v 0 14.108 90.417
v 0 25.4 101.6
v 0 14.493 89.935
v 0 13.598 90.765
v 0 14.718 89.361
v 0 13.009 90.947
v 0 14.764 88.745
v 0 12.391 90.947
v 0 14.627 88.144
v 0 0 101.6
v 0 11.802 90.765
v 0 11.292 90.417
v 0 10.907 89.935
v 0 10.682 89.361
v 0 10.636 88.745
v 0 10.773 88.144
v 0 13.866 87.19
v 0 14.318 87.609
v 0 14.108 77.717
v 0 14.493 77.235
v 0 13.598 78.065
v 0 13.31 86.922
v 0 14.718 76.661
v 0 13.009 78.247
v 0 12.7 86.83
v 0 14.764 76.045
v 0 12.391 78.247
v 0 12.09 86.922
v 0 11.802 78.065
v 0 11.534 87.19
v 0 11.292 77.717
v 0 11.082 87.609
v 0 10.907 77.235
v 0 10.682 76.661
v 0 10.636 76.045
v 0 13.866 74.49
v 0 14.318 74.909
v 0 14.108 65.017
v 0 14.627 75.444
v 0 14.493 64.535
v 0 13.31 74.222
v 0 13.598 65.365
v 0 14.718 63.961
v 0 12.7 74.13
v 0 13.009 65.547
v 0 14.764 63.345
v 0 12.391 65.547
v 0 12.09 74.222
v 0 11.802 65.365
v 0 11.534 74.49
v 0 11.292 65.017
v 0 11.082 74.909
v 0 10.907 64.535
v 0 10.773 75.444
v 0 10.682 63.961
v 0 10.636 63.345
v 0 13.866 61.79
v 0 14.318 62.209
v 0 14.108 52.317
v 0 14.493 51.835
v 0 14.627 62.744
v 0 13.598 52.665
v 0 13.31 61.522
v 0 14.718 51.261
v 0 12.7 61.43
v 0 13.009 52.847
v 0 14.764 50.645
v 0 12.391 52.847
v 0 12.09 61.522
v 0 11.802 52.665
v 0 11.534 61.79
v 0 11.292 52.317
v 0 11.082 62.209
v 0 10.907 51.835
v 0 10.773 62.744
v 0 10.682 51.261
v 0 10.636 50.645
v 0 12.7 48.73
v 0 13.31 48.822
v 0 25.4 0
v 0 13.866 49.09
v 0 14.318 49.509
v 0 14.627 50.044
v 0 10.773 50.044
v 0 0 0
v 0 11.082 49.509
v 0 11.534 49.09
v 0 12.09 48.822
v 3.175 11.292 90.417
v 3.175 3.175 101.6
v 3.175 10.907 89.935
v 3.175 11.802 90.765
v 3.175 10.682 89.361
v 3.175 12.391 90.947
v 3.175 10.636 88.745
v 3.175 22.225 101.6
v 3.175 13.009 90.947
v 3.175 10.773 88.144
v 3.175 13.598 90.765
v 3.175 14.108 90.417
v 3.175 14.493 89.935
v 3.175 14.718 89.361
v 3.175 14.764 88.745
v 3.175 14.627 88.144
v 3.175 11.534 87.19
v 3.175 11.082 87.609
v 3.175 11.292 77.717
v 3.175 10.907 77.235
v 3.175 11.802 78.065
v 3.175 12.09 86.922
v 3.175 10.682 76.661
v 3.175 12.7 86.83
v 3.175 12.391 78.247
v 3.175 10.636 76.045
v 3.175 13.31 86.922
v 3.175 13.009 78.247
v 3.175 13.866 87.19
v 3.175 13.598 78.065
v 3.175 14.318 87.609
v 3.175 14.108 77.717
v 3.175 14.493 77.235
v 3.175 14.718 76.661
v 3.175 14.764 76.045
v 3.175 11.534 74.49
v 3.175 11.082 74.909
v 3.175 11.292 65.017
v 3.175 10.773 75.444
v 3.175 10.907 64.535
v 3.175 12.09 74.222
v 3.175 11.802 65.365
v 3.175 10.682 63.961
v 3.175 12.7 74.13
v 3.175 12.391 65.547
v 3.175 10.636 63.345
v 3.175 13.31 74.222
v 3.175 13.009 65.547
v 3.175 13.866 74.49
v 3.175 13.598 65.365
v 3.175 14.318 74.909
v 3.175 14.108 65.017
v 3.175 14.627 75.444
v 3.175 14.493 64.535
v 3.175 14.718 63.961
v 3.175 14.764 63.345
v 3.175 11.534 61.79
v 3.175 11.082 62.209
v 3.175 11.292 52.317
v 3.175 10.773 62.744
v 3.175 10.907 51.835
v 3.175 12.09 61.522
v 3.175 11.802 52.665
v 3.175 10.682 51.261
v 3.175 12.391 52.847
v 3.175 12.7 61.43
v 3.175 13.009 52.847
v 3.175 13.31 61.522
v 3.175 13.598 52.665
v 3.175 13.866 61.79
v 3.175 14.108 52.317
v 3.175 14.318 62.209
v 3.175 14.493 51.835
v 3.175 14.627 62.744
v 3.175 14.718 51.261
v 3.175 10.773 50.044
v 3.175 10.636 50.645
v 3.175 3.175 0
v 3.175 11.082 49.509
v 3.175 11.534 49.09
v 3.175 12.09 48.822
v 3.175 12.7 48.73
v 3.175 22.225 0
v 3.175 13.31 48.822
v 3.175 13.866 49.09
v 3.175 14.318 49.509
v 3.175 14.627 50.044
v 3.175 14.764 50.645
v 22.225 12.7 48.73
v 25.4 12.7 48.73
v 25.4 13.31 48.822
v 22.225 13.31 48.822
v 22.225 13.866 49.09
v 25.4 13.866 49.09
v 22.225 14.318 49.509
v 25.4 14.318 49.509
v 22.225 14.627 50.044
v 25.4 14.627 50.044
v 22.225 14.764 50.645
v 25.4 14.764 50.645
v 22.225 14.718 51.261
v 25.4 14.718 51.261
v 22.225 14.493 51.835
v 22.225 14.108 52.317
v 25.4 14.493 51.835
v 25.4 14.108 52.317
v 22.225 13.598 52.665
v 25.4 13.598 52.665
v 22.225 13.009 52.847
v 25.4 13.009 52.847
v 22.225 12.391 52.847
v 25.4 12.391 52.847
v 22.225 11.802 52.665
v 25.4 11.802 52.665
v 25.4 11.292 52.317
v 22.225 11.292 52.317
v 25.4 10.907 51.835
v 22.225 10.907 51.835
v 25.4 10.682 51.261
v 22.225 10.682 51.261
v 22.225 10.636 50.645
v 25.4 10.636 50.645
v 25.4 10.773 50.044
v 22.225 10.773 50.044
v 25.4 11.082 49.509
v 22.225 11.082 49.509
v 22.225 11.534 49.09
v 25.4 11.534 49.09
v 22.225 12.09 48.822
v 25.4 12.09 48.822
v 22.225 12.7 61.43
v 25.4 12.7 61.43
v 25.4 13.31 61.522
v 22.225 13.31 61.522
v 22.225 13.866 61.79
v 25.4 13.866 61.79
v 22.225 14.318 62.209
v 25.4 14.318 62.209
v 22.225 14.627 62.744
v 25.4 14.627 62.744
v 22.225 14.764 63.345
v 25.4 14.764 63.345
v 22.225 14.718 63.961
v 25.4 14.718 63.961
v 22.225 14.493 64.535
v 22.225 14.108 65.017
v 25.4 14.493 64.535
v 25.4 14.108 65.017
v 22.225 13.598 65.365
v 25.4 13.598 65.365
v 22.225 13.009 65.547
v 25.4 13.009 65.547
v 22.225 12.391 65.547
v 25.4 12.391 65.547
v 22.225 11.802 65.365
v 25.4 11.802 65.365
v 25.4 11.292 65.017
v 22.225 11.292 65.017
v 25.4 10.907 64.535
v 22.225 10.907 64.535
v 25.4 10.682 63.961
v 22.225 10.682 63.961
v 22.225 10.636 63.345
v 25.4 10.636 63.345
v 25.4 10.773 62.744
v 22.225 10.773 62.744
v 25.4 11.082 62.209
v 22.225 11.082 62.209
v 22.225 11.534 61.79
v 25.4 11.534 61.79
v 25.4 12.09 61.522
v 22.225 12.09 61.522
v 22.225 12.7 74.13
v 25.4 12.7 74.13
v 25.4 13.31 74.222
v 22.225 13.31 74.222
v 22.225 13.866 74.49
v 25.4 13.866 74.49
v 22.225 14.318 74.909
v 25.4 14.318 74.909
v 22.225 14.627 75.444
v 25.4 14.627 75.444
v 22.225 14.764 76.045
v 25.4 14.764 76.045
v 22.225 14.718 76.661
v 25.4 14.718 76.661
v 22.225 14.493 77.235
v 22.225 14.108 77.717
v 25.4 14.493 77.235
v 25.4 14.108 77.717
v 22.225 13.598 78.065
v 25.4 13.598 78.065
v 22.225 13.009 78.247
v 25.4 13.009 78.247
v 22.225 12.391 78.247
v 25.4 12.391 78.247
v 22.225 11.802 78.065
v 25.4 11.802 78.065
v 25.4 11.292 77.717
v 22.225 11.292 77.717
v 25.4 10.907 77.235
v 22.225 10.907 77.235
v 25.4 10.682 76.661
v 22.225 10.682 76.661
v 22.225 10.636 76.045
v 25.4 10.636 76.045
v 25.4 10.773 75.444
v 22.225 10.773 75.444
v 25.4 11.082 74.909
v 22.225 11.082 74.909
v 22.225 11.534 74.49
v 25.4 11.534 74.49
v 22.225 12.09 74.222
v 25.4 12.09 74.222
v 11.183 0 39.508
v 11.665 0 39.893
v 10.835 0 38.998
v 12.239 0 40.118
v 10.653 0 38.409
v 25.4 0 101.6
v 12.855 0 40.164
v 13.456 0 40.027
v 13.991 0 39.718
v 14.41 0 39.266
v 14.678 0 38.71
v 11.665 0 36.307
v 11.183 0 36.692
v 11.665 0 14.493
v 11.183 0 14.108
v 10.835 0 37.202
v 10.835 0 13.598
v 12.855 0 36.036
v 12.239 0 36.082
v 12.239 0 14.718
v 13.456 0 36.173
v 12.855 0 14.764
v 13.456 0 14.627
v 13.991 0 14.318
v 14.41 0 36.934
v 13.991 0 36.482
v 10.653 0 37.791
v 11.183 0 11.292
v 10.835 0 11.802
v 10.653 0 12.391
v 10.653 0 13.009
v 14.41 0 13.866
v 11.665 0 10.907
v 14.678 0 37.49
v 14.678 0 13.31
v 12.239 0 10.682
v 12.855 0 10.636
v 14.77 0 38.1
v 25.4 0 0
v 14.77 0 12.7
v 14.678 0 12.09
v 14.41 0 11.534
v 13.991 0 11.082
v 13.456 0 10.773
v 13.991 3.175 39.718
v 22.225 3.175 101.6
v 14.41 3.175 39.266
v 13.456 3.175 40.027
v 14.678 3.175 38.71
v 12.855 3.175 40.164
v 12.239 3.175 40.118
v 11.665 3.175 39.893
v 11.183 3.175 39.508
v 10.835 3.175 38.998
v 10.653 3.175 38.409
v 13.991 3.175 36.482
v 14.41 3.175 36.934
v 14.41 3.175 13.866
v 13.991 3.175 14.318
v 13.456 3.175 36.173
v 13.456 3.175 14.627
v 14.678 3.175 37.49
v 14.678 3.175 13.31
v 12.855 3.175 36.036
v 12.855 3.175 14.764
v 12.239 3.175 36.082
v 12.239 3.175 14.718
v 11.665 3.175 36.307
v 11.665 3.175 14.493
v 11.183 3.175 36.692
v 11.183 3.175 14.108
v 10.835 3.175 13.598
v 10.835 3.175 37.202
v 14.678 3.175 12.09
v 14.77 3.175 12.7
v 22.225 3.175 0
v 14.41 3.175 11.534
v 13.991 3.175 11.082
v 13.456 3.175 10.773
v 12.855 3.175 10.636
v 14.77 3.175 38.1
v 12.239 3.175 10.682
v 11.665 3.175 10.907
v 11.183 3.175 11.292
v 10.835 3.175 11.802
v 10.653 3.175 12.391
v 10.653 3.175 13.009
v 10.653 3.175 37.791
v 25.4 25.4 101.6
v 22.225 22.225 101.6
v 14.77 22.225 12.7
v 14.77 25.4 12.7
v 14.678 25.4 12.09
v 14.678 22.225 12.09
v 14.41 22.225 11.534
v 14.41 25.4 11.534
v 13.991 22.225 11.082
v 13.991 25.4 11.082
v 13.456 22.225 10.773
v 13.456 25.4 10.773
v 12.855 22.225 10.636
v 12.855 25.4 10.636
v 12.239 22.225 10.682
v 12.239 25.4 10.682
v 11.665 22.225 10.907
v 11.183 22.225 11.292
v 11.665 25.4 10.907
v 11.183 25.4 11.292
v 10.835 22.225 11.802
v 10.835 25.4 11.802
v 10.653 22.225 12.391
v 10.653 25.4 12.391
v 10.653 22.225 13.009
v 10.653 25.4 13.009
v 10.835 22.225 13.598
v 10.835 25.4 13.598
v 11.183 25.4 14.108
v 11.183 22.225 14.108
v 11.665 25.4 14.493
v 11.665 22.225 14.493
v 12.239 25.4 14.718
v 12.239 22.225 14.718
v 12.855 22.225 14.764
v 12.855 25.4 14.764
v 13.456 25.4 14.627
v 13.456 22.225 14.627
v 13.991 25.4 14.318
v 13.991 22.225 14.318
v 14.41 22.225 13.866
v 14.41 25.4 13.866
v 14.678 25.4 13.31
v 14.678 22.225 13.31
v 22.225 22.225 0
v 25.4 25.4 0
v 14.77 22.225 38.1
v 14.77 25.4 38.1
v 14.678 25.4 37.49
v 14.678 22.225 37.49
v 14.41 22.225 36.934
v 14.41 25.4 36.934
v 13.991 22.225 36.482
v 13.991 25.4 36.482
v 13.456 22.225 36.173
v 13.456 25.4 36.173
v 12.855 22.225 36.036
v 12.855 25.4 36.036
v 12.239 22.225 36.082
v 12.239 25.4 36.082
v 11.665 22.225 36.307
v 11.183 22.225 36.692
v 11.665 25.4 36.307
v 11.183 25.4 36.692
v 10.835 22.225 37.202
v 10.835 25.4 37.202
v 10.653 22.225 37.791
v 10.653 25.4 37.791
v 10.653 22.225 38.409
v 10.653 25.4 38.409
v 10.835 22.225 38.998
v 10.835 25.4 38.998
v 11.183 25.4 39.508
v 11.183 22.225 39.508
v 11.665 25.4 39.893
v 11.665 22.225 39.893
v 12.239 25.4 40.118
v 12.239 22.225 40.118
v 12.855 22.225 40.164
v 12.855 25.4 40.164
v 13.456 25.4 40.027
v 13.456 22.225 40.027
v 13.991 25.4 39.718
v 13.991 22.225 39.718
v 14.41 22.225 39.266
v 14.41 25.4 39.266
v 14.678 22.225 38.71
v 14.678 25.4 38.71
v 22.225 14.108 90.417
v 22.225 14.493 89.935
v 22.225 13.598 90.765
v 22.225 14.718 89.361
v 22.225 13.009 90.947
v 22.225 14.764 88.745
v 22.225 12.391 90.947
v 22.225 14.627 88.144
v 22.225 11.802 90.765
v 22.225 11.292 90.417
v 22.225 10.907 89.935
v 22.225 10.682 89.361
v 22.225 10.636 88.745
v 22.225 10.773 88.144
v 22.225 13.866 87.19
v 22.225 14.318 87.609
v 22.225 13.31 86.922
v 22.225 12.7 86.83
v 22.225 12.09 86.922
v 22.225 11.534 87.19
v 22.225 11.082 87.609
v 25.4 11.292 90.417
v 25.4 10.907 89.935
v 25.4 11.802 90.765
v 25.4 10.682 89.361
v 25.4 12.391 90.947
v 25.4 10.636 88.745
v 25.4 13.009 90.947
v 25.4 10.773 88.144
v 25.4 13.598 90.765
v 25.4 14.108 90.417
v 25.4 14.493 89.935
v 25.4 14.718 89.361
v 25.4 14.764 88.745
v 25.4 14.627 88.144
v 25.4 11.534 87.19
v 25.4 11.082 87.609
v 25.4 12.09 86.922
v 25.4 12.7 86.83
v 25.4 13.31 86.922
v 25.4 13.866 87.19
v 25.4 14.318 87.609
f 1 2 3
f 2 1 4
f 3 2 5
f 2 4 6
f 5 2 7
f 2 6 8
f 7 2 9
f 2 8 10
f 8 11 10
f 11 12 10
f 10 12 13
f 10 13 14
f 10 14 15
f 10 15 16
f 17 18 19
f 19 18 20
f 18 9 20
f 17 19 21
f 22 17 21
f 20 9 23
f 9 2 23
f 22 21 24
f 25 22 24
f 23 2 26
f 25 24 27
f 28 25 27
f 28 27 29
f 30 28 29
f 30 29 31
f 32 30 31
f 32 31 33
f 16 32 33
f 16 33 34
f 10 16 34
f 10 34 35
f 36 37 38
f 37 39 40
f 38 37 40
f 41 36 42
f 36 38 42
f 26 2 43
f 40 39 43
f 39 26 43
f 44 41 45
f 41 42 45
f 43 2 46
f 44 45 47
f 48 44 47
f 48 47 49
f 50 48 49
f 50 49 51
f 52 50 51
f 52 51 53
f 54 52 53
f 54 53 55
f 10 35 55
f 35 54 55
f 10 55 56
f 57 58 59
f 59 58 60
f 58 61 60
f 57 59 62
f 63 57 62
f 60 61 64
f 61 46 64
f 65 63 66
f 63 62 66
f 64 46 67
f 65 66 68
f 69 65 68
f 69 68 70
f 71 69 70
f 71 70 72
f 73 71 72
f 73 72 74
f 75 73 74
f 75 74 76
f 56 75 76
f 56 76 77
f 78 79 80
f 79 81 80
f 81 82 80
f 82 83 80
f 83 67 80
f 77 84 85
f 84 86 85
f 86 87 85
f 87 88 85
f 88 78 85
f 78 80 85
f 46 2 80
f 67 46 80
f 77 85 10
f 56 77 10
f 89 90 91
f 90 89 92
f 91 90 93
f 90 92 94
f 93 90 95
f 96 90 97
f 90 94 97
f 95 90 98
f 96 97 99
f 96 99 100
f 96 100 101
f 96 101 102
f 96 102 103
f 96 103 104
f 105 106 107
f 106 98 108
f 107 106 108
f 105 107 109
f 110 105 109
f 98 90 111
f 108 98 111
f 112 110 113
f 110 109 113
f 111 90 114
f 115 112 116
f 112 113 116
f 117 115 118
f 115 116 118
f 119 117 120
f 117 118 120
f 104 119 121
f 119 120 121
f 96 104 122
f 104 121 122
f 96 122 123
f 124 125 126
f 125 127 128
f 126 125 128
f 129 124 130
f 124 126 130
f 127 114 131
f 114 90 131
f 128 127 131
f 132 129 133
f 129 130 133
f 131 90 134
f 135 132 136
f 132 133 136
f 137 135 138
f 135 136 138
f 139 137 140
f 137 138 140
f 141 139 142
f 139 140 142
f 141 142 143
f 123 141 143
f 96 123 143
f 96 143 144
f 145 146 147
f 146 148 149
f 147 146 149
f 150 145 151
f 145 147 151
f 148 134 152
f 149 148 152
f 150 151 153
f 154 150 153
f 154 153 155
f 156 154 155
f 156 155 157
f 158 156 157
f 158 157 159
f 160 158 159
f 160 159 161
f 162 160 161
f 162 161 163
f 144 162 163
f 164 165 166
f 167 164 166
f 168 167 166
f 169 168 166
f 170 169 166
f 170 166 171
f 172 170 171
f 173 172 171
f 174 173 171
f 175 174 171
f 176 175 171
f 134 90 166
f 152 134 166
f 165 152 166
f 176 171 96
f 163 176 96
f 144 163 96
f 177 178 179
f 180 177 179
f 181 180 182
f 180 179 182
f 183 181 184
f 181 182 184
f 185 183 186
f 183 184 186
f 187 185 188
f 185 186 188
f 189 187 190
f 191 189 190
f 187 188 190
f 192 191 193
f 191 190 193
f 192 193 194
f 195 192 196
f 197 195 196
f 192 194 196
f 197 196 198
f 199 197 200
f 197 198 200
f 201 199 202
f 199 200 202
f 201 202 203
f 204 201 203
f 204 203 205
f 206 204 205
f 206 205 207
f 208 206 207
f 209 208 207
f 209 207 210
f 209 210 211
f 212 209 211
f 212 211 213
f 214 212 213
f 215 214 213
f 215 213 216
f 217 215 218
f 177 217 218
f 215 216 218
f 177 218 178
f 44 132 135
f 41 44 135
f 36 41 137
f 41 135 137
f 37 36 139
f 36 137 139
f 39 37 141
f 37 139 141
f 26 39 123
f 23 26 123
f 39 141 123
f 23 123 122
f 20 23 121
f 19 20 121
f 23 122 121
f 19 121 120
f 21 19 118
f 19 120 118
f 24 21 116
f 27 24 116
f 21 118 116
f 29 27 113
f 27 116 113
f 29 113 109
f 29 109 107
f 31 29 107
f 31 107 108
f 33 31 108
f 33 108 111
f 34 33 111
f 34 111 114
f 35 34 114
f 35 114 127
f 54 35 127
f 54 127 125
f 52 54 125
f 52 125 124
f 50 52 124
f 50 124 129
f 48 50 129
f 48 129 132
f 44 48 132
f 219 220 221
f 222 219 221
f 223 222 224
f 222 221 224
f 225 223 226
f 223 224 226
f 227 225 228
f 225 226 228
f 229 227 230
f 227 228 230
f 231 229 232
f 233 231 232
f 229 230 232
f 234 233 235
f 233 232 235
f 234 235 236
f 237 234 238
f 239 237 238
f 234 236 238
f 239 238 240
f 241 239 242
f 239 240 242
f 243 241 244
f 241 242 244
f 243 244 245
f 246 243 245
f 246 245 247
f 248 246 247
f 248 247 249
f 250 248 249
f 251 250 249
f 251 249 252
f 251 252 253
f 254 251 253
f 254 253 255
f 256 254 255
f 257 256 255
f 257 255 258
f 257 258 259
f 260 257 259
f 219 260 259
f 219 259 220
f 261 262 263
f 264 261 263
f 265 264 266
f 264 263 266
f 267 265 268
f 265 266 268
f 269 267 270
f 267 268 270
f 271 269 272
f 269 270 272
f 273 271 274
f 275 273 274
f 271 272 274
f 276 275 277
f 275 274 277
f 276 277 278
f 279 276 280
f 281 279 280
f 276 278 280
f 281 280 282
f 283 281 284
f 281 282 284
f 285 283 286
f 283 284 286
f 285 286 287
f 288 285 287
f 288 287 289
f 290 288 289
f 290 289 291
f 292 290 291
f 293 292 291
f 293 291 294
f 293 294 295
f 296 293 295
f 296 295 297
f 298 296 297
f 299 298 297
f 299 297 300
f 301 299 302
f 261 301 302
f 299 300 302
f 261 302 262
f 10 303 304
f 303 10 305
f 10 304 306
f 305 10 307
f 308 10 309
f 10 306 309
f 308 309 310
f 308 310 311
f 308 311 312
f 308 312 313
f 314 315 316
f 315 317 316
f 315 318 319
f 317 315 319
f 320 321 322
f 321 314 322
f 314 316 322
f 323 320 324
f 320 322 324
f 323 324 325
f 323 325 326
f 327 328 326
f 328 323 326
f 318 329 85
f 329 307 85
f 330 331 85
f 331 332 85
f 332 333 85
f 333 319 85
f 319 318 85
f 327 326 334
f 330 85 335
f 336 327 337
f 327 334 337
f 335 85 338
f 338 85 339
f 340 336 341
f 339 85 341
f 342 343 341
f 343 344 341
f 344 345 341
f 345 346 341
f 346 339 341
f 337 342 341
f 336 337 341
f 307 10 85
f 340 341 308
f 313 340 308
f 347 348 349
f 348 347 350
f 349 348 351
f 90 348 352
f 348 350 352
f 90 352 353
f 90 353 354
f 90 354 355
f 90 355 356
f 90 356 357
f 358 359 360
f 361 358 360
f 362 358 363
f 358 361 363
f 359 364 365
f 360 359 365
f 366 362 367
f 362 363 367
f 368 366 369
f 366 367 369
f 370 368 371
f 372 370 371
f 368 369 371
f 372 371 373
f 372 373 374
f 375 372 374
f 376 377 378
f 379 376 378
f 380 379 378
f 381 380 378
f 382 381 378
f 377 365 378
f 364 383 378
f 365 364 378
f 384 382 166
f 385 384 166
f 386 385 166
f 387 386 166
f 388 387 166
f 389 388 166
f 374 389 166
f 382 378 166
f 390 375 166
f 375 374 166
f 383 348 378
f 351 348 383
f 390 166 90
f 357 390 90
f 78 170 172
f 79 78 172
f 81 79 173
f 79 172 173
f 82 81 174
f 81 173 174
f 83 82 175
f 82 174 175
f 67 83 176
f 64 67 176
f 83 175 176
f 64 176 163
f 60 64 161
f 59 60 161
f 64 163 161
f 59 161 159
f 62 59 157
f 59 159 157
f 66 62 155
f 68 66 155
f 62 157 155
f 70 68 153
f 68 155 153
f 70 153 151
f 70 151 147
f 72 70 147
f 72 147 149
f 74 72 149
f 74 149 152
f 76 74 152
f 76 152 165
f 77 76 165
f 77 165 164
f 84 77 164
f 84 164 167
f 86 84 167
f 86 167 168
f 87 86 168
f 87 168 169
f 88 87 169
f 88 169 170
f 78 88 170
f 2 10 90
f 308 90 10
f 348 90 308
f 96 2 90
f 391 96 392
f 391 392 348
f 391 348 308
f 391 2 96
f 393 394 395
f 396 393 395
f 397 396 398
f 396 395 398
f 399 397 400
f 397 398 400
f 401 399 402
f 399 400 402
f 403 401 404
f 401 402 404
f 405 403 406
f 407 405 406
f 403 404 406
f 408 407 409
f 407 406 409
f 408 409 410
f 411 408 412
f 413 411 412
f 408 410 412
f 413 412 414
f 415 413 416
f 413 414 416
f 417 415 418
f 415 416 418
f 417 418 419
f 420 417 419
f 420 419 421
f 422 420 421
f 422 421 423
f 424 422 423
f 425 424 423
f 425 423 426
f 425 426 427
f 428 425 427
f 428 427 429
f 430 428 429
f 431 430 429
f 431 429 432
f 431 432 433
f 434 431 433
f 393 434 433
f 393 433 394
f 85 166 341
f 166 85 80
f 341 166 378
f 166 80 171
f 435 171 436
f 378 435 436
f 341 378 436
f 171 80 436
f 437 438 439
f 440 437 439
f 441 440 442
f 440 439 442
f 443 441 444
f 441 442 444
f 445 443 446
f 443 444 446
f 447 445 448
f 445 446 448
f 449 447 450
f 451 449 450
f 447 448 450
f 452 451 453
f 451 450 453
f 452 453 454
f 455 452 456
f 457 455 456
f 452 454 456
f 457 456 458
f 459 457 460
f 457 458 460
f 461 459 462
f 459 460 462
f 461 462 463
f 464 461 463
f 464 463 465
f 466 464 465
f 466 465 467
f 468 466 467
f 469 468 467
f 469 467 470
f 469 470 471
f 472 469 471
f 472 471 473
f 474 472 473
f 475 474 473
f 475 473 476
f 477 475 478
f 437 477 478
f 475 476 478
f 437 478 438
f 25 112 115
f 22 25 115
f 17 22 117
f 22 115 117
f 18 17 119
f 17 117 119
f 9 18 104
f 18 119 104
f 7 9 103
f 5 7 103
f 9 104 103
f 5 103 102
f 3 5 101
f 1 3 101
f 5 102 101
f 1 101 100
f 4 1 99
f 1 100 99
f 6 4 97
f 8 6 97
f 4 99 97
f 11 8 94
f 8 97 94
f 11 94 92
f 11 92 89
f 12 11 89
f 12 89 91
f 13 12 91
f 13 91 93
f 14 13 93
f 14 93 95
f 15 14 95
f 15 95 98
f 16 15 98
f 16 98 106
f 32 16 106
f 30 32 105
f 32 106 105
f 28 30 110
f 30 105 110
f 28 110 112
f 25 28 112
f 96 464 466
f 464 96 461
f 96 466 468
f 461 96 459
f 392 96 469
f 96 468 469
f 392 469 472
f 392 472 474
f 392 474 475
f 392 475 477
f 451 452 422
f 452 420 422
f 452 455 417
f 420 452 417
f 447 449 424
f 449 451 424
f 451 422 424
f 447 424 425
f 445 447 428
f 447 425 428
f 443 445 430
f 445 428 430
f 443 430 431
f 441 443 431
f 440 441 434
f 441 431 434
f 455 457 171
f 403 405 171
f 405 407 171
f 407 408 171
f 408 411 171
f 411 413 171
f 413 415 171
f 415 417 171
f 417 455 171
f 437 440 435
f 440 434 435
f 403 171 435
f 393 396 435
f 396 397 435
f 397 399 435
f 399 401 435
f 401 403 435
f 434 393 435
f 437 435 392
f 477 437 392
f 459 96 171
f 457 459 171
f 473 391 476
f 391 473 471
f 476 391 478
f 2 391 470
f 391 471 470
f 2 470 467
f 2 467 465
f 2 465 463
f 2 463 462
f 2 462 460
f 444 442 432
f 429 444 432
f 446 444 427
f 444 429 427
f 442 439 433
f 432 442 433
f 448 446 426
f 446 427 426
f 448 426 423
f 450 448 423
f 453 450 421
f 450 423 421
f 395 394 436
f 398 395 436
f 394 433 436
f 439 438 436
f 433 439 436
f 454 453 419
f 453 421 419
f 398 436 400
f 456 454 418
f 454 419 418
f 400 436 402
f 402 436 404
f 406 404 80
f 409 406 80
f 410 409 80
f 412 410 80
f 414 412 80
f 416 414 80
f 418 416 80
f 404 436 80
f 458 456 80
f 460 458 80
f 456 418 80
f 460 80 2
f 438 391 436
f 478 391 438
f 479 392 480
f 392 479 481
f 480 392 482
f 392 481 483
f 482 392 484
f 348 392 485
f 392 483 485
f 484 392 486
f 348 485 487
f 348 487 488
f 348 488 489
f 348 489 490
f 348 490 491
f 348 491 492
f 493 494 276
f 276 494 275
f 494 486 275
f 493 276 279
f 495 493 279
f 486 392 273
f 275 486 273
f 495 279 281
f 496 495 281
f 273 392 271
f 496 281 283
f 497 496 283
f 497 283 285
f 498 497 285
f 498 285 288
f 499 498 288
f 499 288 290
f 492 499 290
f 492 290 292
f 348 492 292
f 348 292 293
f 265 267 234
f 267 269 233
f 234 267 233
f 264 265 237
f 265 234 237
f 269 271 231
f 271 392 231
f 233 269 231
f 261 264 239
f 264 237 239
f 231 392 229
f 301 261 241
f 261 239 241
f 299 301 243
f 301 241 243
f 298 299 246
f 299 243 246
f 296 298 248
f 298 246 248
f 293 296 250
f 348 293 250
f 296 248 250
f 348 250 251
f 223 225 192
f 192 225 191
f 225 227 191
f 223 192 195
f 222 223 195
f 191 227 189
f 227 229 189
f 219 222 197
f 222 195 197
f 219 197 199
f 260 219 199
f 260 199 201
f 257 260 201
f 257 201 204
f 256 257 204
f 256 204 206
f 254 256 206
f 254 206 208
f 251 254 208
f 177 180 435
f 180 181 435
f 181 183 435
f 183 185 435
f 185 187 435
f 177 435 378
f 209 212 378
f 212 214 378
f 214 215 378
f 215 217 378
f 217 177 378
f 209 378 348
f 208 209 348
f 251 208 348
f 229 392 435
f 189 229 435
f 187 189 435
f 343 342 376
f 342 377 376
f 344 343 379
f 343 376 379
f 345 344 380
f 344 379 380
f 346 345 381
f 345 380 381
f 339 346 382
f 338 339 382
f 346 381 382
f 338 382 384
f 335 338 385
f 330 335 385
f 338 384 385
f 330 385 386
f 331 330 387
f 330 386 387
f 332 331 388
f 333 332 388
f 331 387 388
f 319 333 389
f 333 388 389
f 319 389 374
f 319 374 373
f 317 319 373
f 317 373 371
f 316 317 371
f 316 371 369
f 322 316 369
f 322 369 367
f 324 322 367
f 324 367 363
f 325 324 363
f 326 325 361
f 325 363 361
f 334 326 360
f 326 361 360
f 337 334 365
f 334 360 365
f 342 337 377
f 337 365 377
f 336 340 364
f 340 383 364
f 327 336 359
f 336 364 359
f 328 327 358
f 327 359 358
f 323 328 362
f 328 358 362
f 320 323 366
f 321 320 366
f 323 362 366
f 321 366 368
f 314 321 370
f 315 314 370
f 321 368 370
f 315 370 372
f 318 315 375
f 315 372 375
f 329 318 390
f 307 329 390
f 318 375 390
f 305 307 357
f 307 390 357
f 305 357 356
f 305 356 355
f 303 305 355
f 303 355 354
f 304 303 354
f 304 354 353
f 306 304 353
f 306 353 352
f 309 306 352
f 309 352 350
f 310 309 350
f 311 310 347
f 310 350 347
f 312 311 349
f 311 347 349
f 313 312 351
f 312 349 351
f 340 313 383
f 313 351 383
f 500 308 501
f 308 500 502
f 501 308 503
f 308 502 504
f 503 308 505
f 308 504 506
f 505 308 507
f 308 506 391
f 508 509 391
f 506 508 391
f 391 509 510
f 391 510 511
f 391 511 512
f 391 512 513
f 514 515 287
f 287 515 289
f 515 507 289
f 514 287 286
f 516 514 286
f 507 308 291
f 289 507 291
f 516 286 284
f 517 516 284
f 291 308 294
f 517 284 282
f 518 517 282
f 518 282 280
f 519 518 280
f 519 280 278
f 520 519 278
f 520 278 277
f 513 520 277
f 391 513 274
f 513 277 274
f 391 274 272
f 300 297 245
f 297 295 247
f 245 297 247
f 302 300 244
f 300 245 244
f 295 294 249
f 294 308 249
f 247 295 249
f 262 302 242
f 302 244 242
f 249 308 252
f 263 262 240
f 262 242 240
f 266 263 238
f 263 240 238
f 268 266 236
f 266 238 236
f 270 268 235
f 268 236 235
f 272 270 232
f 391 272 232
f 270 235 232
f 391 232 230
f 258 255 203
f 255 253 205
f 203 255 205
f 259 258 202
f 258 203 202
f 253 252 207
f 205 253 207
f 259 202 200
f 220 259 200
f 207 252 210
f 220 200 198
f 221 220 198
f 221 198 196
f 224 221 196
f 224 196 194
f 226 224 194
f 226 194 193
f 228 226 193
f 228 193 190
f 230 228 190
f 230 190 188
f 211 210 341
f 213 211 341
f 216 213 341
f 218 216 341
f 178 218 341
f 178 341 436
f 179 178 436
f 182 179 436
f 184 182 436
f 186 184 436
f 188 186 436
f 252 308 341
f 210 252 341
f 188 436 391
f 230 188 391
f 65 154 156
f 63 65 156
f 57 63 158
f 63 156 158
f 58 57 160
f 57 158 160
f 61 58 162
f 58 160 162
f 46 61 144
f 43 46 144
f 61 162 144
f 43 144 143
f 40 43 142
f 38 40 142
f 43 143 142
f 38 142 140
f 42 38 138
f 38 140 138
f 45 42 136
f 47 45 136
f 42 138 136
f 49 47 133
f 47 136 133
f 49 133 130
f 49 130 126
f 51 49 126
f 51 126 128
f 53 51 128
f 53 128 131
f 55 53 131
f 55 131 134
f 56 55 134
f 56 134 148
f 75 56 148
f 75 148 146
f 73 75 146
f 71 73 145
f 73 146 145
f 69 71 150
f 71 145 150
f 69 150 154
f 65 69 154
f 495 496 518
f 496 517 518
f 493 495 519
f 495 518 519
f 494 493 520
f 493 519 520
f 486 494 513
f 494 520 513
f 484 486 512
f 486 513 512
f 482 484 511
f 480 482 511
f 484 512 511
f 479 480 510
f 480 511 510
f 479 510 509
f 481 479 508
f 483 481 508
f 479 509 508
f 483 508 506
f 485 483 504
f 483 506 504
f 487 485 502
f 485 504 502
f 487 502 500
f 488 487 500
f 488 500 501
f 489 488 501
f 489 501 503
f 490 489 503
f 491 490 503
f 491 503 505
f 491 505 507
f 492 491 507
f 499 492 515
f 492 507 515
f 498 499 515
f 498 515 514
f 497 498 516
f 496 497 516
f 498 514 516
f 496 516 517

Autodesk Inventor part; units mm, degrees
ref_plane "YZ Plane" through (0, 0, 0) normal (1, 0, 0) x (0, 1, 0)
ref_plane "XZ Plane" through (0, 0, 0) normal (0, 1, 0) x (-1, 0, 0)
ref_plane "XY Plane" through (0, 0, 0) normal (0, 0, 1) x (1, 0, 0)
sketch "Sketch1" plane through (0, 0, 0) normal (0, 0, 1) x (1, 0, 0)
  line L0 (0, 0) -> (25.4, 0)
  line L1 (25.4, 0) -> (25.4, 25.4)
  line L2 (25.4, 25.4) -> (0, 25.4)
  line L3 (0, 25.4) -> (0, 0)
  line L4 (3.175, 22.225) -> (22.225, 22.225)
  line L5 (22.225, 22.225) -> (22.225, 3.175)
  line L6 (22.225, 3.175) -> (3.175, 3.175)
  line L7 (3.175, 3.175) -> (3.175, 22.225)
  dimension "d0" = 25.4
  dimension "d1" = 25.4
  dimension "d2" = 3.175
extrude "Extrusion1" add sketch "Sketch1" along normal blind 101.6
sketch "Sketch2" plane through (25.4, 0, 0) normal (1, 0, 0) x (0, 0, -1)
  line L0 (-101.6, 0) -> (-101.6, 25.4) projected
  line L1 (0, 0) -> (-101.6, 0) projected
  circle A0 centre (-88.9, 12.7) radius 2.0701
  circle A1 centre (-76.2, 12.7) radius 2.0701
  circle A2 centre (-63.5, 12.7) radius 2.0701
  circle A3 centre (-50.8, 12.7) radius 2.0701
  dimension "d5" = 4.1402
  dimension "d6" = 12.7
  dimension "d7" = 12.7
  dimension "d10" = 12.7
extrude "Extrusion2" cut sketch "Sketch2" against normal blind 101.6
sketch "Sketch3" plane through (0, 25.4, 0) normal (0, 1, 0) x (1, 0, 0)
  line L0 (25.4, 0) -> (0, 0) projected
  line L1 (25.4, 0) -> (25.4, -101.6) projected
  circle A0 centre (12.7, -12.7) radius 2.0701
  circle A1 centre (12.7, -38.1) radius 2.0701
  dimension "d17" = 4.1402
  dimension "d18" = 12.7
  dimension "d19" = 12.7
  dimension "d22" = 25.4
extrude "Extrusion3" cut sketch "Sketch3" against normal blind 101.6
properties part number "Clapper Pneumatic Supports (2)"
